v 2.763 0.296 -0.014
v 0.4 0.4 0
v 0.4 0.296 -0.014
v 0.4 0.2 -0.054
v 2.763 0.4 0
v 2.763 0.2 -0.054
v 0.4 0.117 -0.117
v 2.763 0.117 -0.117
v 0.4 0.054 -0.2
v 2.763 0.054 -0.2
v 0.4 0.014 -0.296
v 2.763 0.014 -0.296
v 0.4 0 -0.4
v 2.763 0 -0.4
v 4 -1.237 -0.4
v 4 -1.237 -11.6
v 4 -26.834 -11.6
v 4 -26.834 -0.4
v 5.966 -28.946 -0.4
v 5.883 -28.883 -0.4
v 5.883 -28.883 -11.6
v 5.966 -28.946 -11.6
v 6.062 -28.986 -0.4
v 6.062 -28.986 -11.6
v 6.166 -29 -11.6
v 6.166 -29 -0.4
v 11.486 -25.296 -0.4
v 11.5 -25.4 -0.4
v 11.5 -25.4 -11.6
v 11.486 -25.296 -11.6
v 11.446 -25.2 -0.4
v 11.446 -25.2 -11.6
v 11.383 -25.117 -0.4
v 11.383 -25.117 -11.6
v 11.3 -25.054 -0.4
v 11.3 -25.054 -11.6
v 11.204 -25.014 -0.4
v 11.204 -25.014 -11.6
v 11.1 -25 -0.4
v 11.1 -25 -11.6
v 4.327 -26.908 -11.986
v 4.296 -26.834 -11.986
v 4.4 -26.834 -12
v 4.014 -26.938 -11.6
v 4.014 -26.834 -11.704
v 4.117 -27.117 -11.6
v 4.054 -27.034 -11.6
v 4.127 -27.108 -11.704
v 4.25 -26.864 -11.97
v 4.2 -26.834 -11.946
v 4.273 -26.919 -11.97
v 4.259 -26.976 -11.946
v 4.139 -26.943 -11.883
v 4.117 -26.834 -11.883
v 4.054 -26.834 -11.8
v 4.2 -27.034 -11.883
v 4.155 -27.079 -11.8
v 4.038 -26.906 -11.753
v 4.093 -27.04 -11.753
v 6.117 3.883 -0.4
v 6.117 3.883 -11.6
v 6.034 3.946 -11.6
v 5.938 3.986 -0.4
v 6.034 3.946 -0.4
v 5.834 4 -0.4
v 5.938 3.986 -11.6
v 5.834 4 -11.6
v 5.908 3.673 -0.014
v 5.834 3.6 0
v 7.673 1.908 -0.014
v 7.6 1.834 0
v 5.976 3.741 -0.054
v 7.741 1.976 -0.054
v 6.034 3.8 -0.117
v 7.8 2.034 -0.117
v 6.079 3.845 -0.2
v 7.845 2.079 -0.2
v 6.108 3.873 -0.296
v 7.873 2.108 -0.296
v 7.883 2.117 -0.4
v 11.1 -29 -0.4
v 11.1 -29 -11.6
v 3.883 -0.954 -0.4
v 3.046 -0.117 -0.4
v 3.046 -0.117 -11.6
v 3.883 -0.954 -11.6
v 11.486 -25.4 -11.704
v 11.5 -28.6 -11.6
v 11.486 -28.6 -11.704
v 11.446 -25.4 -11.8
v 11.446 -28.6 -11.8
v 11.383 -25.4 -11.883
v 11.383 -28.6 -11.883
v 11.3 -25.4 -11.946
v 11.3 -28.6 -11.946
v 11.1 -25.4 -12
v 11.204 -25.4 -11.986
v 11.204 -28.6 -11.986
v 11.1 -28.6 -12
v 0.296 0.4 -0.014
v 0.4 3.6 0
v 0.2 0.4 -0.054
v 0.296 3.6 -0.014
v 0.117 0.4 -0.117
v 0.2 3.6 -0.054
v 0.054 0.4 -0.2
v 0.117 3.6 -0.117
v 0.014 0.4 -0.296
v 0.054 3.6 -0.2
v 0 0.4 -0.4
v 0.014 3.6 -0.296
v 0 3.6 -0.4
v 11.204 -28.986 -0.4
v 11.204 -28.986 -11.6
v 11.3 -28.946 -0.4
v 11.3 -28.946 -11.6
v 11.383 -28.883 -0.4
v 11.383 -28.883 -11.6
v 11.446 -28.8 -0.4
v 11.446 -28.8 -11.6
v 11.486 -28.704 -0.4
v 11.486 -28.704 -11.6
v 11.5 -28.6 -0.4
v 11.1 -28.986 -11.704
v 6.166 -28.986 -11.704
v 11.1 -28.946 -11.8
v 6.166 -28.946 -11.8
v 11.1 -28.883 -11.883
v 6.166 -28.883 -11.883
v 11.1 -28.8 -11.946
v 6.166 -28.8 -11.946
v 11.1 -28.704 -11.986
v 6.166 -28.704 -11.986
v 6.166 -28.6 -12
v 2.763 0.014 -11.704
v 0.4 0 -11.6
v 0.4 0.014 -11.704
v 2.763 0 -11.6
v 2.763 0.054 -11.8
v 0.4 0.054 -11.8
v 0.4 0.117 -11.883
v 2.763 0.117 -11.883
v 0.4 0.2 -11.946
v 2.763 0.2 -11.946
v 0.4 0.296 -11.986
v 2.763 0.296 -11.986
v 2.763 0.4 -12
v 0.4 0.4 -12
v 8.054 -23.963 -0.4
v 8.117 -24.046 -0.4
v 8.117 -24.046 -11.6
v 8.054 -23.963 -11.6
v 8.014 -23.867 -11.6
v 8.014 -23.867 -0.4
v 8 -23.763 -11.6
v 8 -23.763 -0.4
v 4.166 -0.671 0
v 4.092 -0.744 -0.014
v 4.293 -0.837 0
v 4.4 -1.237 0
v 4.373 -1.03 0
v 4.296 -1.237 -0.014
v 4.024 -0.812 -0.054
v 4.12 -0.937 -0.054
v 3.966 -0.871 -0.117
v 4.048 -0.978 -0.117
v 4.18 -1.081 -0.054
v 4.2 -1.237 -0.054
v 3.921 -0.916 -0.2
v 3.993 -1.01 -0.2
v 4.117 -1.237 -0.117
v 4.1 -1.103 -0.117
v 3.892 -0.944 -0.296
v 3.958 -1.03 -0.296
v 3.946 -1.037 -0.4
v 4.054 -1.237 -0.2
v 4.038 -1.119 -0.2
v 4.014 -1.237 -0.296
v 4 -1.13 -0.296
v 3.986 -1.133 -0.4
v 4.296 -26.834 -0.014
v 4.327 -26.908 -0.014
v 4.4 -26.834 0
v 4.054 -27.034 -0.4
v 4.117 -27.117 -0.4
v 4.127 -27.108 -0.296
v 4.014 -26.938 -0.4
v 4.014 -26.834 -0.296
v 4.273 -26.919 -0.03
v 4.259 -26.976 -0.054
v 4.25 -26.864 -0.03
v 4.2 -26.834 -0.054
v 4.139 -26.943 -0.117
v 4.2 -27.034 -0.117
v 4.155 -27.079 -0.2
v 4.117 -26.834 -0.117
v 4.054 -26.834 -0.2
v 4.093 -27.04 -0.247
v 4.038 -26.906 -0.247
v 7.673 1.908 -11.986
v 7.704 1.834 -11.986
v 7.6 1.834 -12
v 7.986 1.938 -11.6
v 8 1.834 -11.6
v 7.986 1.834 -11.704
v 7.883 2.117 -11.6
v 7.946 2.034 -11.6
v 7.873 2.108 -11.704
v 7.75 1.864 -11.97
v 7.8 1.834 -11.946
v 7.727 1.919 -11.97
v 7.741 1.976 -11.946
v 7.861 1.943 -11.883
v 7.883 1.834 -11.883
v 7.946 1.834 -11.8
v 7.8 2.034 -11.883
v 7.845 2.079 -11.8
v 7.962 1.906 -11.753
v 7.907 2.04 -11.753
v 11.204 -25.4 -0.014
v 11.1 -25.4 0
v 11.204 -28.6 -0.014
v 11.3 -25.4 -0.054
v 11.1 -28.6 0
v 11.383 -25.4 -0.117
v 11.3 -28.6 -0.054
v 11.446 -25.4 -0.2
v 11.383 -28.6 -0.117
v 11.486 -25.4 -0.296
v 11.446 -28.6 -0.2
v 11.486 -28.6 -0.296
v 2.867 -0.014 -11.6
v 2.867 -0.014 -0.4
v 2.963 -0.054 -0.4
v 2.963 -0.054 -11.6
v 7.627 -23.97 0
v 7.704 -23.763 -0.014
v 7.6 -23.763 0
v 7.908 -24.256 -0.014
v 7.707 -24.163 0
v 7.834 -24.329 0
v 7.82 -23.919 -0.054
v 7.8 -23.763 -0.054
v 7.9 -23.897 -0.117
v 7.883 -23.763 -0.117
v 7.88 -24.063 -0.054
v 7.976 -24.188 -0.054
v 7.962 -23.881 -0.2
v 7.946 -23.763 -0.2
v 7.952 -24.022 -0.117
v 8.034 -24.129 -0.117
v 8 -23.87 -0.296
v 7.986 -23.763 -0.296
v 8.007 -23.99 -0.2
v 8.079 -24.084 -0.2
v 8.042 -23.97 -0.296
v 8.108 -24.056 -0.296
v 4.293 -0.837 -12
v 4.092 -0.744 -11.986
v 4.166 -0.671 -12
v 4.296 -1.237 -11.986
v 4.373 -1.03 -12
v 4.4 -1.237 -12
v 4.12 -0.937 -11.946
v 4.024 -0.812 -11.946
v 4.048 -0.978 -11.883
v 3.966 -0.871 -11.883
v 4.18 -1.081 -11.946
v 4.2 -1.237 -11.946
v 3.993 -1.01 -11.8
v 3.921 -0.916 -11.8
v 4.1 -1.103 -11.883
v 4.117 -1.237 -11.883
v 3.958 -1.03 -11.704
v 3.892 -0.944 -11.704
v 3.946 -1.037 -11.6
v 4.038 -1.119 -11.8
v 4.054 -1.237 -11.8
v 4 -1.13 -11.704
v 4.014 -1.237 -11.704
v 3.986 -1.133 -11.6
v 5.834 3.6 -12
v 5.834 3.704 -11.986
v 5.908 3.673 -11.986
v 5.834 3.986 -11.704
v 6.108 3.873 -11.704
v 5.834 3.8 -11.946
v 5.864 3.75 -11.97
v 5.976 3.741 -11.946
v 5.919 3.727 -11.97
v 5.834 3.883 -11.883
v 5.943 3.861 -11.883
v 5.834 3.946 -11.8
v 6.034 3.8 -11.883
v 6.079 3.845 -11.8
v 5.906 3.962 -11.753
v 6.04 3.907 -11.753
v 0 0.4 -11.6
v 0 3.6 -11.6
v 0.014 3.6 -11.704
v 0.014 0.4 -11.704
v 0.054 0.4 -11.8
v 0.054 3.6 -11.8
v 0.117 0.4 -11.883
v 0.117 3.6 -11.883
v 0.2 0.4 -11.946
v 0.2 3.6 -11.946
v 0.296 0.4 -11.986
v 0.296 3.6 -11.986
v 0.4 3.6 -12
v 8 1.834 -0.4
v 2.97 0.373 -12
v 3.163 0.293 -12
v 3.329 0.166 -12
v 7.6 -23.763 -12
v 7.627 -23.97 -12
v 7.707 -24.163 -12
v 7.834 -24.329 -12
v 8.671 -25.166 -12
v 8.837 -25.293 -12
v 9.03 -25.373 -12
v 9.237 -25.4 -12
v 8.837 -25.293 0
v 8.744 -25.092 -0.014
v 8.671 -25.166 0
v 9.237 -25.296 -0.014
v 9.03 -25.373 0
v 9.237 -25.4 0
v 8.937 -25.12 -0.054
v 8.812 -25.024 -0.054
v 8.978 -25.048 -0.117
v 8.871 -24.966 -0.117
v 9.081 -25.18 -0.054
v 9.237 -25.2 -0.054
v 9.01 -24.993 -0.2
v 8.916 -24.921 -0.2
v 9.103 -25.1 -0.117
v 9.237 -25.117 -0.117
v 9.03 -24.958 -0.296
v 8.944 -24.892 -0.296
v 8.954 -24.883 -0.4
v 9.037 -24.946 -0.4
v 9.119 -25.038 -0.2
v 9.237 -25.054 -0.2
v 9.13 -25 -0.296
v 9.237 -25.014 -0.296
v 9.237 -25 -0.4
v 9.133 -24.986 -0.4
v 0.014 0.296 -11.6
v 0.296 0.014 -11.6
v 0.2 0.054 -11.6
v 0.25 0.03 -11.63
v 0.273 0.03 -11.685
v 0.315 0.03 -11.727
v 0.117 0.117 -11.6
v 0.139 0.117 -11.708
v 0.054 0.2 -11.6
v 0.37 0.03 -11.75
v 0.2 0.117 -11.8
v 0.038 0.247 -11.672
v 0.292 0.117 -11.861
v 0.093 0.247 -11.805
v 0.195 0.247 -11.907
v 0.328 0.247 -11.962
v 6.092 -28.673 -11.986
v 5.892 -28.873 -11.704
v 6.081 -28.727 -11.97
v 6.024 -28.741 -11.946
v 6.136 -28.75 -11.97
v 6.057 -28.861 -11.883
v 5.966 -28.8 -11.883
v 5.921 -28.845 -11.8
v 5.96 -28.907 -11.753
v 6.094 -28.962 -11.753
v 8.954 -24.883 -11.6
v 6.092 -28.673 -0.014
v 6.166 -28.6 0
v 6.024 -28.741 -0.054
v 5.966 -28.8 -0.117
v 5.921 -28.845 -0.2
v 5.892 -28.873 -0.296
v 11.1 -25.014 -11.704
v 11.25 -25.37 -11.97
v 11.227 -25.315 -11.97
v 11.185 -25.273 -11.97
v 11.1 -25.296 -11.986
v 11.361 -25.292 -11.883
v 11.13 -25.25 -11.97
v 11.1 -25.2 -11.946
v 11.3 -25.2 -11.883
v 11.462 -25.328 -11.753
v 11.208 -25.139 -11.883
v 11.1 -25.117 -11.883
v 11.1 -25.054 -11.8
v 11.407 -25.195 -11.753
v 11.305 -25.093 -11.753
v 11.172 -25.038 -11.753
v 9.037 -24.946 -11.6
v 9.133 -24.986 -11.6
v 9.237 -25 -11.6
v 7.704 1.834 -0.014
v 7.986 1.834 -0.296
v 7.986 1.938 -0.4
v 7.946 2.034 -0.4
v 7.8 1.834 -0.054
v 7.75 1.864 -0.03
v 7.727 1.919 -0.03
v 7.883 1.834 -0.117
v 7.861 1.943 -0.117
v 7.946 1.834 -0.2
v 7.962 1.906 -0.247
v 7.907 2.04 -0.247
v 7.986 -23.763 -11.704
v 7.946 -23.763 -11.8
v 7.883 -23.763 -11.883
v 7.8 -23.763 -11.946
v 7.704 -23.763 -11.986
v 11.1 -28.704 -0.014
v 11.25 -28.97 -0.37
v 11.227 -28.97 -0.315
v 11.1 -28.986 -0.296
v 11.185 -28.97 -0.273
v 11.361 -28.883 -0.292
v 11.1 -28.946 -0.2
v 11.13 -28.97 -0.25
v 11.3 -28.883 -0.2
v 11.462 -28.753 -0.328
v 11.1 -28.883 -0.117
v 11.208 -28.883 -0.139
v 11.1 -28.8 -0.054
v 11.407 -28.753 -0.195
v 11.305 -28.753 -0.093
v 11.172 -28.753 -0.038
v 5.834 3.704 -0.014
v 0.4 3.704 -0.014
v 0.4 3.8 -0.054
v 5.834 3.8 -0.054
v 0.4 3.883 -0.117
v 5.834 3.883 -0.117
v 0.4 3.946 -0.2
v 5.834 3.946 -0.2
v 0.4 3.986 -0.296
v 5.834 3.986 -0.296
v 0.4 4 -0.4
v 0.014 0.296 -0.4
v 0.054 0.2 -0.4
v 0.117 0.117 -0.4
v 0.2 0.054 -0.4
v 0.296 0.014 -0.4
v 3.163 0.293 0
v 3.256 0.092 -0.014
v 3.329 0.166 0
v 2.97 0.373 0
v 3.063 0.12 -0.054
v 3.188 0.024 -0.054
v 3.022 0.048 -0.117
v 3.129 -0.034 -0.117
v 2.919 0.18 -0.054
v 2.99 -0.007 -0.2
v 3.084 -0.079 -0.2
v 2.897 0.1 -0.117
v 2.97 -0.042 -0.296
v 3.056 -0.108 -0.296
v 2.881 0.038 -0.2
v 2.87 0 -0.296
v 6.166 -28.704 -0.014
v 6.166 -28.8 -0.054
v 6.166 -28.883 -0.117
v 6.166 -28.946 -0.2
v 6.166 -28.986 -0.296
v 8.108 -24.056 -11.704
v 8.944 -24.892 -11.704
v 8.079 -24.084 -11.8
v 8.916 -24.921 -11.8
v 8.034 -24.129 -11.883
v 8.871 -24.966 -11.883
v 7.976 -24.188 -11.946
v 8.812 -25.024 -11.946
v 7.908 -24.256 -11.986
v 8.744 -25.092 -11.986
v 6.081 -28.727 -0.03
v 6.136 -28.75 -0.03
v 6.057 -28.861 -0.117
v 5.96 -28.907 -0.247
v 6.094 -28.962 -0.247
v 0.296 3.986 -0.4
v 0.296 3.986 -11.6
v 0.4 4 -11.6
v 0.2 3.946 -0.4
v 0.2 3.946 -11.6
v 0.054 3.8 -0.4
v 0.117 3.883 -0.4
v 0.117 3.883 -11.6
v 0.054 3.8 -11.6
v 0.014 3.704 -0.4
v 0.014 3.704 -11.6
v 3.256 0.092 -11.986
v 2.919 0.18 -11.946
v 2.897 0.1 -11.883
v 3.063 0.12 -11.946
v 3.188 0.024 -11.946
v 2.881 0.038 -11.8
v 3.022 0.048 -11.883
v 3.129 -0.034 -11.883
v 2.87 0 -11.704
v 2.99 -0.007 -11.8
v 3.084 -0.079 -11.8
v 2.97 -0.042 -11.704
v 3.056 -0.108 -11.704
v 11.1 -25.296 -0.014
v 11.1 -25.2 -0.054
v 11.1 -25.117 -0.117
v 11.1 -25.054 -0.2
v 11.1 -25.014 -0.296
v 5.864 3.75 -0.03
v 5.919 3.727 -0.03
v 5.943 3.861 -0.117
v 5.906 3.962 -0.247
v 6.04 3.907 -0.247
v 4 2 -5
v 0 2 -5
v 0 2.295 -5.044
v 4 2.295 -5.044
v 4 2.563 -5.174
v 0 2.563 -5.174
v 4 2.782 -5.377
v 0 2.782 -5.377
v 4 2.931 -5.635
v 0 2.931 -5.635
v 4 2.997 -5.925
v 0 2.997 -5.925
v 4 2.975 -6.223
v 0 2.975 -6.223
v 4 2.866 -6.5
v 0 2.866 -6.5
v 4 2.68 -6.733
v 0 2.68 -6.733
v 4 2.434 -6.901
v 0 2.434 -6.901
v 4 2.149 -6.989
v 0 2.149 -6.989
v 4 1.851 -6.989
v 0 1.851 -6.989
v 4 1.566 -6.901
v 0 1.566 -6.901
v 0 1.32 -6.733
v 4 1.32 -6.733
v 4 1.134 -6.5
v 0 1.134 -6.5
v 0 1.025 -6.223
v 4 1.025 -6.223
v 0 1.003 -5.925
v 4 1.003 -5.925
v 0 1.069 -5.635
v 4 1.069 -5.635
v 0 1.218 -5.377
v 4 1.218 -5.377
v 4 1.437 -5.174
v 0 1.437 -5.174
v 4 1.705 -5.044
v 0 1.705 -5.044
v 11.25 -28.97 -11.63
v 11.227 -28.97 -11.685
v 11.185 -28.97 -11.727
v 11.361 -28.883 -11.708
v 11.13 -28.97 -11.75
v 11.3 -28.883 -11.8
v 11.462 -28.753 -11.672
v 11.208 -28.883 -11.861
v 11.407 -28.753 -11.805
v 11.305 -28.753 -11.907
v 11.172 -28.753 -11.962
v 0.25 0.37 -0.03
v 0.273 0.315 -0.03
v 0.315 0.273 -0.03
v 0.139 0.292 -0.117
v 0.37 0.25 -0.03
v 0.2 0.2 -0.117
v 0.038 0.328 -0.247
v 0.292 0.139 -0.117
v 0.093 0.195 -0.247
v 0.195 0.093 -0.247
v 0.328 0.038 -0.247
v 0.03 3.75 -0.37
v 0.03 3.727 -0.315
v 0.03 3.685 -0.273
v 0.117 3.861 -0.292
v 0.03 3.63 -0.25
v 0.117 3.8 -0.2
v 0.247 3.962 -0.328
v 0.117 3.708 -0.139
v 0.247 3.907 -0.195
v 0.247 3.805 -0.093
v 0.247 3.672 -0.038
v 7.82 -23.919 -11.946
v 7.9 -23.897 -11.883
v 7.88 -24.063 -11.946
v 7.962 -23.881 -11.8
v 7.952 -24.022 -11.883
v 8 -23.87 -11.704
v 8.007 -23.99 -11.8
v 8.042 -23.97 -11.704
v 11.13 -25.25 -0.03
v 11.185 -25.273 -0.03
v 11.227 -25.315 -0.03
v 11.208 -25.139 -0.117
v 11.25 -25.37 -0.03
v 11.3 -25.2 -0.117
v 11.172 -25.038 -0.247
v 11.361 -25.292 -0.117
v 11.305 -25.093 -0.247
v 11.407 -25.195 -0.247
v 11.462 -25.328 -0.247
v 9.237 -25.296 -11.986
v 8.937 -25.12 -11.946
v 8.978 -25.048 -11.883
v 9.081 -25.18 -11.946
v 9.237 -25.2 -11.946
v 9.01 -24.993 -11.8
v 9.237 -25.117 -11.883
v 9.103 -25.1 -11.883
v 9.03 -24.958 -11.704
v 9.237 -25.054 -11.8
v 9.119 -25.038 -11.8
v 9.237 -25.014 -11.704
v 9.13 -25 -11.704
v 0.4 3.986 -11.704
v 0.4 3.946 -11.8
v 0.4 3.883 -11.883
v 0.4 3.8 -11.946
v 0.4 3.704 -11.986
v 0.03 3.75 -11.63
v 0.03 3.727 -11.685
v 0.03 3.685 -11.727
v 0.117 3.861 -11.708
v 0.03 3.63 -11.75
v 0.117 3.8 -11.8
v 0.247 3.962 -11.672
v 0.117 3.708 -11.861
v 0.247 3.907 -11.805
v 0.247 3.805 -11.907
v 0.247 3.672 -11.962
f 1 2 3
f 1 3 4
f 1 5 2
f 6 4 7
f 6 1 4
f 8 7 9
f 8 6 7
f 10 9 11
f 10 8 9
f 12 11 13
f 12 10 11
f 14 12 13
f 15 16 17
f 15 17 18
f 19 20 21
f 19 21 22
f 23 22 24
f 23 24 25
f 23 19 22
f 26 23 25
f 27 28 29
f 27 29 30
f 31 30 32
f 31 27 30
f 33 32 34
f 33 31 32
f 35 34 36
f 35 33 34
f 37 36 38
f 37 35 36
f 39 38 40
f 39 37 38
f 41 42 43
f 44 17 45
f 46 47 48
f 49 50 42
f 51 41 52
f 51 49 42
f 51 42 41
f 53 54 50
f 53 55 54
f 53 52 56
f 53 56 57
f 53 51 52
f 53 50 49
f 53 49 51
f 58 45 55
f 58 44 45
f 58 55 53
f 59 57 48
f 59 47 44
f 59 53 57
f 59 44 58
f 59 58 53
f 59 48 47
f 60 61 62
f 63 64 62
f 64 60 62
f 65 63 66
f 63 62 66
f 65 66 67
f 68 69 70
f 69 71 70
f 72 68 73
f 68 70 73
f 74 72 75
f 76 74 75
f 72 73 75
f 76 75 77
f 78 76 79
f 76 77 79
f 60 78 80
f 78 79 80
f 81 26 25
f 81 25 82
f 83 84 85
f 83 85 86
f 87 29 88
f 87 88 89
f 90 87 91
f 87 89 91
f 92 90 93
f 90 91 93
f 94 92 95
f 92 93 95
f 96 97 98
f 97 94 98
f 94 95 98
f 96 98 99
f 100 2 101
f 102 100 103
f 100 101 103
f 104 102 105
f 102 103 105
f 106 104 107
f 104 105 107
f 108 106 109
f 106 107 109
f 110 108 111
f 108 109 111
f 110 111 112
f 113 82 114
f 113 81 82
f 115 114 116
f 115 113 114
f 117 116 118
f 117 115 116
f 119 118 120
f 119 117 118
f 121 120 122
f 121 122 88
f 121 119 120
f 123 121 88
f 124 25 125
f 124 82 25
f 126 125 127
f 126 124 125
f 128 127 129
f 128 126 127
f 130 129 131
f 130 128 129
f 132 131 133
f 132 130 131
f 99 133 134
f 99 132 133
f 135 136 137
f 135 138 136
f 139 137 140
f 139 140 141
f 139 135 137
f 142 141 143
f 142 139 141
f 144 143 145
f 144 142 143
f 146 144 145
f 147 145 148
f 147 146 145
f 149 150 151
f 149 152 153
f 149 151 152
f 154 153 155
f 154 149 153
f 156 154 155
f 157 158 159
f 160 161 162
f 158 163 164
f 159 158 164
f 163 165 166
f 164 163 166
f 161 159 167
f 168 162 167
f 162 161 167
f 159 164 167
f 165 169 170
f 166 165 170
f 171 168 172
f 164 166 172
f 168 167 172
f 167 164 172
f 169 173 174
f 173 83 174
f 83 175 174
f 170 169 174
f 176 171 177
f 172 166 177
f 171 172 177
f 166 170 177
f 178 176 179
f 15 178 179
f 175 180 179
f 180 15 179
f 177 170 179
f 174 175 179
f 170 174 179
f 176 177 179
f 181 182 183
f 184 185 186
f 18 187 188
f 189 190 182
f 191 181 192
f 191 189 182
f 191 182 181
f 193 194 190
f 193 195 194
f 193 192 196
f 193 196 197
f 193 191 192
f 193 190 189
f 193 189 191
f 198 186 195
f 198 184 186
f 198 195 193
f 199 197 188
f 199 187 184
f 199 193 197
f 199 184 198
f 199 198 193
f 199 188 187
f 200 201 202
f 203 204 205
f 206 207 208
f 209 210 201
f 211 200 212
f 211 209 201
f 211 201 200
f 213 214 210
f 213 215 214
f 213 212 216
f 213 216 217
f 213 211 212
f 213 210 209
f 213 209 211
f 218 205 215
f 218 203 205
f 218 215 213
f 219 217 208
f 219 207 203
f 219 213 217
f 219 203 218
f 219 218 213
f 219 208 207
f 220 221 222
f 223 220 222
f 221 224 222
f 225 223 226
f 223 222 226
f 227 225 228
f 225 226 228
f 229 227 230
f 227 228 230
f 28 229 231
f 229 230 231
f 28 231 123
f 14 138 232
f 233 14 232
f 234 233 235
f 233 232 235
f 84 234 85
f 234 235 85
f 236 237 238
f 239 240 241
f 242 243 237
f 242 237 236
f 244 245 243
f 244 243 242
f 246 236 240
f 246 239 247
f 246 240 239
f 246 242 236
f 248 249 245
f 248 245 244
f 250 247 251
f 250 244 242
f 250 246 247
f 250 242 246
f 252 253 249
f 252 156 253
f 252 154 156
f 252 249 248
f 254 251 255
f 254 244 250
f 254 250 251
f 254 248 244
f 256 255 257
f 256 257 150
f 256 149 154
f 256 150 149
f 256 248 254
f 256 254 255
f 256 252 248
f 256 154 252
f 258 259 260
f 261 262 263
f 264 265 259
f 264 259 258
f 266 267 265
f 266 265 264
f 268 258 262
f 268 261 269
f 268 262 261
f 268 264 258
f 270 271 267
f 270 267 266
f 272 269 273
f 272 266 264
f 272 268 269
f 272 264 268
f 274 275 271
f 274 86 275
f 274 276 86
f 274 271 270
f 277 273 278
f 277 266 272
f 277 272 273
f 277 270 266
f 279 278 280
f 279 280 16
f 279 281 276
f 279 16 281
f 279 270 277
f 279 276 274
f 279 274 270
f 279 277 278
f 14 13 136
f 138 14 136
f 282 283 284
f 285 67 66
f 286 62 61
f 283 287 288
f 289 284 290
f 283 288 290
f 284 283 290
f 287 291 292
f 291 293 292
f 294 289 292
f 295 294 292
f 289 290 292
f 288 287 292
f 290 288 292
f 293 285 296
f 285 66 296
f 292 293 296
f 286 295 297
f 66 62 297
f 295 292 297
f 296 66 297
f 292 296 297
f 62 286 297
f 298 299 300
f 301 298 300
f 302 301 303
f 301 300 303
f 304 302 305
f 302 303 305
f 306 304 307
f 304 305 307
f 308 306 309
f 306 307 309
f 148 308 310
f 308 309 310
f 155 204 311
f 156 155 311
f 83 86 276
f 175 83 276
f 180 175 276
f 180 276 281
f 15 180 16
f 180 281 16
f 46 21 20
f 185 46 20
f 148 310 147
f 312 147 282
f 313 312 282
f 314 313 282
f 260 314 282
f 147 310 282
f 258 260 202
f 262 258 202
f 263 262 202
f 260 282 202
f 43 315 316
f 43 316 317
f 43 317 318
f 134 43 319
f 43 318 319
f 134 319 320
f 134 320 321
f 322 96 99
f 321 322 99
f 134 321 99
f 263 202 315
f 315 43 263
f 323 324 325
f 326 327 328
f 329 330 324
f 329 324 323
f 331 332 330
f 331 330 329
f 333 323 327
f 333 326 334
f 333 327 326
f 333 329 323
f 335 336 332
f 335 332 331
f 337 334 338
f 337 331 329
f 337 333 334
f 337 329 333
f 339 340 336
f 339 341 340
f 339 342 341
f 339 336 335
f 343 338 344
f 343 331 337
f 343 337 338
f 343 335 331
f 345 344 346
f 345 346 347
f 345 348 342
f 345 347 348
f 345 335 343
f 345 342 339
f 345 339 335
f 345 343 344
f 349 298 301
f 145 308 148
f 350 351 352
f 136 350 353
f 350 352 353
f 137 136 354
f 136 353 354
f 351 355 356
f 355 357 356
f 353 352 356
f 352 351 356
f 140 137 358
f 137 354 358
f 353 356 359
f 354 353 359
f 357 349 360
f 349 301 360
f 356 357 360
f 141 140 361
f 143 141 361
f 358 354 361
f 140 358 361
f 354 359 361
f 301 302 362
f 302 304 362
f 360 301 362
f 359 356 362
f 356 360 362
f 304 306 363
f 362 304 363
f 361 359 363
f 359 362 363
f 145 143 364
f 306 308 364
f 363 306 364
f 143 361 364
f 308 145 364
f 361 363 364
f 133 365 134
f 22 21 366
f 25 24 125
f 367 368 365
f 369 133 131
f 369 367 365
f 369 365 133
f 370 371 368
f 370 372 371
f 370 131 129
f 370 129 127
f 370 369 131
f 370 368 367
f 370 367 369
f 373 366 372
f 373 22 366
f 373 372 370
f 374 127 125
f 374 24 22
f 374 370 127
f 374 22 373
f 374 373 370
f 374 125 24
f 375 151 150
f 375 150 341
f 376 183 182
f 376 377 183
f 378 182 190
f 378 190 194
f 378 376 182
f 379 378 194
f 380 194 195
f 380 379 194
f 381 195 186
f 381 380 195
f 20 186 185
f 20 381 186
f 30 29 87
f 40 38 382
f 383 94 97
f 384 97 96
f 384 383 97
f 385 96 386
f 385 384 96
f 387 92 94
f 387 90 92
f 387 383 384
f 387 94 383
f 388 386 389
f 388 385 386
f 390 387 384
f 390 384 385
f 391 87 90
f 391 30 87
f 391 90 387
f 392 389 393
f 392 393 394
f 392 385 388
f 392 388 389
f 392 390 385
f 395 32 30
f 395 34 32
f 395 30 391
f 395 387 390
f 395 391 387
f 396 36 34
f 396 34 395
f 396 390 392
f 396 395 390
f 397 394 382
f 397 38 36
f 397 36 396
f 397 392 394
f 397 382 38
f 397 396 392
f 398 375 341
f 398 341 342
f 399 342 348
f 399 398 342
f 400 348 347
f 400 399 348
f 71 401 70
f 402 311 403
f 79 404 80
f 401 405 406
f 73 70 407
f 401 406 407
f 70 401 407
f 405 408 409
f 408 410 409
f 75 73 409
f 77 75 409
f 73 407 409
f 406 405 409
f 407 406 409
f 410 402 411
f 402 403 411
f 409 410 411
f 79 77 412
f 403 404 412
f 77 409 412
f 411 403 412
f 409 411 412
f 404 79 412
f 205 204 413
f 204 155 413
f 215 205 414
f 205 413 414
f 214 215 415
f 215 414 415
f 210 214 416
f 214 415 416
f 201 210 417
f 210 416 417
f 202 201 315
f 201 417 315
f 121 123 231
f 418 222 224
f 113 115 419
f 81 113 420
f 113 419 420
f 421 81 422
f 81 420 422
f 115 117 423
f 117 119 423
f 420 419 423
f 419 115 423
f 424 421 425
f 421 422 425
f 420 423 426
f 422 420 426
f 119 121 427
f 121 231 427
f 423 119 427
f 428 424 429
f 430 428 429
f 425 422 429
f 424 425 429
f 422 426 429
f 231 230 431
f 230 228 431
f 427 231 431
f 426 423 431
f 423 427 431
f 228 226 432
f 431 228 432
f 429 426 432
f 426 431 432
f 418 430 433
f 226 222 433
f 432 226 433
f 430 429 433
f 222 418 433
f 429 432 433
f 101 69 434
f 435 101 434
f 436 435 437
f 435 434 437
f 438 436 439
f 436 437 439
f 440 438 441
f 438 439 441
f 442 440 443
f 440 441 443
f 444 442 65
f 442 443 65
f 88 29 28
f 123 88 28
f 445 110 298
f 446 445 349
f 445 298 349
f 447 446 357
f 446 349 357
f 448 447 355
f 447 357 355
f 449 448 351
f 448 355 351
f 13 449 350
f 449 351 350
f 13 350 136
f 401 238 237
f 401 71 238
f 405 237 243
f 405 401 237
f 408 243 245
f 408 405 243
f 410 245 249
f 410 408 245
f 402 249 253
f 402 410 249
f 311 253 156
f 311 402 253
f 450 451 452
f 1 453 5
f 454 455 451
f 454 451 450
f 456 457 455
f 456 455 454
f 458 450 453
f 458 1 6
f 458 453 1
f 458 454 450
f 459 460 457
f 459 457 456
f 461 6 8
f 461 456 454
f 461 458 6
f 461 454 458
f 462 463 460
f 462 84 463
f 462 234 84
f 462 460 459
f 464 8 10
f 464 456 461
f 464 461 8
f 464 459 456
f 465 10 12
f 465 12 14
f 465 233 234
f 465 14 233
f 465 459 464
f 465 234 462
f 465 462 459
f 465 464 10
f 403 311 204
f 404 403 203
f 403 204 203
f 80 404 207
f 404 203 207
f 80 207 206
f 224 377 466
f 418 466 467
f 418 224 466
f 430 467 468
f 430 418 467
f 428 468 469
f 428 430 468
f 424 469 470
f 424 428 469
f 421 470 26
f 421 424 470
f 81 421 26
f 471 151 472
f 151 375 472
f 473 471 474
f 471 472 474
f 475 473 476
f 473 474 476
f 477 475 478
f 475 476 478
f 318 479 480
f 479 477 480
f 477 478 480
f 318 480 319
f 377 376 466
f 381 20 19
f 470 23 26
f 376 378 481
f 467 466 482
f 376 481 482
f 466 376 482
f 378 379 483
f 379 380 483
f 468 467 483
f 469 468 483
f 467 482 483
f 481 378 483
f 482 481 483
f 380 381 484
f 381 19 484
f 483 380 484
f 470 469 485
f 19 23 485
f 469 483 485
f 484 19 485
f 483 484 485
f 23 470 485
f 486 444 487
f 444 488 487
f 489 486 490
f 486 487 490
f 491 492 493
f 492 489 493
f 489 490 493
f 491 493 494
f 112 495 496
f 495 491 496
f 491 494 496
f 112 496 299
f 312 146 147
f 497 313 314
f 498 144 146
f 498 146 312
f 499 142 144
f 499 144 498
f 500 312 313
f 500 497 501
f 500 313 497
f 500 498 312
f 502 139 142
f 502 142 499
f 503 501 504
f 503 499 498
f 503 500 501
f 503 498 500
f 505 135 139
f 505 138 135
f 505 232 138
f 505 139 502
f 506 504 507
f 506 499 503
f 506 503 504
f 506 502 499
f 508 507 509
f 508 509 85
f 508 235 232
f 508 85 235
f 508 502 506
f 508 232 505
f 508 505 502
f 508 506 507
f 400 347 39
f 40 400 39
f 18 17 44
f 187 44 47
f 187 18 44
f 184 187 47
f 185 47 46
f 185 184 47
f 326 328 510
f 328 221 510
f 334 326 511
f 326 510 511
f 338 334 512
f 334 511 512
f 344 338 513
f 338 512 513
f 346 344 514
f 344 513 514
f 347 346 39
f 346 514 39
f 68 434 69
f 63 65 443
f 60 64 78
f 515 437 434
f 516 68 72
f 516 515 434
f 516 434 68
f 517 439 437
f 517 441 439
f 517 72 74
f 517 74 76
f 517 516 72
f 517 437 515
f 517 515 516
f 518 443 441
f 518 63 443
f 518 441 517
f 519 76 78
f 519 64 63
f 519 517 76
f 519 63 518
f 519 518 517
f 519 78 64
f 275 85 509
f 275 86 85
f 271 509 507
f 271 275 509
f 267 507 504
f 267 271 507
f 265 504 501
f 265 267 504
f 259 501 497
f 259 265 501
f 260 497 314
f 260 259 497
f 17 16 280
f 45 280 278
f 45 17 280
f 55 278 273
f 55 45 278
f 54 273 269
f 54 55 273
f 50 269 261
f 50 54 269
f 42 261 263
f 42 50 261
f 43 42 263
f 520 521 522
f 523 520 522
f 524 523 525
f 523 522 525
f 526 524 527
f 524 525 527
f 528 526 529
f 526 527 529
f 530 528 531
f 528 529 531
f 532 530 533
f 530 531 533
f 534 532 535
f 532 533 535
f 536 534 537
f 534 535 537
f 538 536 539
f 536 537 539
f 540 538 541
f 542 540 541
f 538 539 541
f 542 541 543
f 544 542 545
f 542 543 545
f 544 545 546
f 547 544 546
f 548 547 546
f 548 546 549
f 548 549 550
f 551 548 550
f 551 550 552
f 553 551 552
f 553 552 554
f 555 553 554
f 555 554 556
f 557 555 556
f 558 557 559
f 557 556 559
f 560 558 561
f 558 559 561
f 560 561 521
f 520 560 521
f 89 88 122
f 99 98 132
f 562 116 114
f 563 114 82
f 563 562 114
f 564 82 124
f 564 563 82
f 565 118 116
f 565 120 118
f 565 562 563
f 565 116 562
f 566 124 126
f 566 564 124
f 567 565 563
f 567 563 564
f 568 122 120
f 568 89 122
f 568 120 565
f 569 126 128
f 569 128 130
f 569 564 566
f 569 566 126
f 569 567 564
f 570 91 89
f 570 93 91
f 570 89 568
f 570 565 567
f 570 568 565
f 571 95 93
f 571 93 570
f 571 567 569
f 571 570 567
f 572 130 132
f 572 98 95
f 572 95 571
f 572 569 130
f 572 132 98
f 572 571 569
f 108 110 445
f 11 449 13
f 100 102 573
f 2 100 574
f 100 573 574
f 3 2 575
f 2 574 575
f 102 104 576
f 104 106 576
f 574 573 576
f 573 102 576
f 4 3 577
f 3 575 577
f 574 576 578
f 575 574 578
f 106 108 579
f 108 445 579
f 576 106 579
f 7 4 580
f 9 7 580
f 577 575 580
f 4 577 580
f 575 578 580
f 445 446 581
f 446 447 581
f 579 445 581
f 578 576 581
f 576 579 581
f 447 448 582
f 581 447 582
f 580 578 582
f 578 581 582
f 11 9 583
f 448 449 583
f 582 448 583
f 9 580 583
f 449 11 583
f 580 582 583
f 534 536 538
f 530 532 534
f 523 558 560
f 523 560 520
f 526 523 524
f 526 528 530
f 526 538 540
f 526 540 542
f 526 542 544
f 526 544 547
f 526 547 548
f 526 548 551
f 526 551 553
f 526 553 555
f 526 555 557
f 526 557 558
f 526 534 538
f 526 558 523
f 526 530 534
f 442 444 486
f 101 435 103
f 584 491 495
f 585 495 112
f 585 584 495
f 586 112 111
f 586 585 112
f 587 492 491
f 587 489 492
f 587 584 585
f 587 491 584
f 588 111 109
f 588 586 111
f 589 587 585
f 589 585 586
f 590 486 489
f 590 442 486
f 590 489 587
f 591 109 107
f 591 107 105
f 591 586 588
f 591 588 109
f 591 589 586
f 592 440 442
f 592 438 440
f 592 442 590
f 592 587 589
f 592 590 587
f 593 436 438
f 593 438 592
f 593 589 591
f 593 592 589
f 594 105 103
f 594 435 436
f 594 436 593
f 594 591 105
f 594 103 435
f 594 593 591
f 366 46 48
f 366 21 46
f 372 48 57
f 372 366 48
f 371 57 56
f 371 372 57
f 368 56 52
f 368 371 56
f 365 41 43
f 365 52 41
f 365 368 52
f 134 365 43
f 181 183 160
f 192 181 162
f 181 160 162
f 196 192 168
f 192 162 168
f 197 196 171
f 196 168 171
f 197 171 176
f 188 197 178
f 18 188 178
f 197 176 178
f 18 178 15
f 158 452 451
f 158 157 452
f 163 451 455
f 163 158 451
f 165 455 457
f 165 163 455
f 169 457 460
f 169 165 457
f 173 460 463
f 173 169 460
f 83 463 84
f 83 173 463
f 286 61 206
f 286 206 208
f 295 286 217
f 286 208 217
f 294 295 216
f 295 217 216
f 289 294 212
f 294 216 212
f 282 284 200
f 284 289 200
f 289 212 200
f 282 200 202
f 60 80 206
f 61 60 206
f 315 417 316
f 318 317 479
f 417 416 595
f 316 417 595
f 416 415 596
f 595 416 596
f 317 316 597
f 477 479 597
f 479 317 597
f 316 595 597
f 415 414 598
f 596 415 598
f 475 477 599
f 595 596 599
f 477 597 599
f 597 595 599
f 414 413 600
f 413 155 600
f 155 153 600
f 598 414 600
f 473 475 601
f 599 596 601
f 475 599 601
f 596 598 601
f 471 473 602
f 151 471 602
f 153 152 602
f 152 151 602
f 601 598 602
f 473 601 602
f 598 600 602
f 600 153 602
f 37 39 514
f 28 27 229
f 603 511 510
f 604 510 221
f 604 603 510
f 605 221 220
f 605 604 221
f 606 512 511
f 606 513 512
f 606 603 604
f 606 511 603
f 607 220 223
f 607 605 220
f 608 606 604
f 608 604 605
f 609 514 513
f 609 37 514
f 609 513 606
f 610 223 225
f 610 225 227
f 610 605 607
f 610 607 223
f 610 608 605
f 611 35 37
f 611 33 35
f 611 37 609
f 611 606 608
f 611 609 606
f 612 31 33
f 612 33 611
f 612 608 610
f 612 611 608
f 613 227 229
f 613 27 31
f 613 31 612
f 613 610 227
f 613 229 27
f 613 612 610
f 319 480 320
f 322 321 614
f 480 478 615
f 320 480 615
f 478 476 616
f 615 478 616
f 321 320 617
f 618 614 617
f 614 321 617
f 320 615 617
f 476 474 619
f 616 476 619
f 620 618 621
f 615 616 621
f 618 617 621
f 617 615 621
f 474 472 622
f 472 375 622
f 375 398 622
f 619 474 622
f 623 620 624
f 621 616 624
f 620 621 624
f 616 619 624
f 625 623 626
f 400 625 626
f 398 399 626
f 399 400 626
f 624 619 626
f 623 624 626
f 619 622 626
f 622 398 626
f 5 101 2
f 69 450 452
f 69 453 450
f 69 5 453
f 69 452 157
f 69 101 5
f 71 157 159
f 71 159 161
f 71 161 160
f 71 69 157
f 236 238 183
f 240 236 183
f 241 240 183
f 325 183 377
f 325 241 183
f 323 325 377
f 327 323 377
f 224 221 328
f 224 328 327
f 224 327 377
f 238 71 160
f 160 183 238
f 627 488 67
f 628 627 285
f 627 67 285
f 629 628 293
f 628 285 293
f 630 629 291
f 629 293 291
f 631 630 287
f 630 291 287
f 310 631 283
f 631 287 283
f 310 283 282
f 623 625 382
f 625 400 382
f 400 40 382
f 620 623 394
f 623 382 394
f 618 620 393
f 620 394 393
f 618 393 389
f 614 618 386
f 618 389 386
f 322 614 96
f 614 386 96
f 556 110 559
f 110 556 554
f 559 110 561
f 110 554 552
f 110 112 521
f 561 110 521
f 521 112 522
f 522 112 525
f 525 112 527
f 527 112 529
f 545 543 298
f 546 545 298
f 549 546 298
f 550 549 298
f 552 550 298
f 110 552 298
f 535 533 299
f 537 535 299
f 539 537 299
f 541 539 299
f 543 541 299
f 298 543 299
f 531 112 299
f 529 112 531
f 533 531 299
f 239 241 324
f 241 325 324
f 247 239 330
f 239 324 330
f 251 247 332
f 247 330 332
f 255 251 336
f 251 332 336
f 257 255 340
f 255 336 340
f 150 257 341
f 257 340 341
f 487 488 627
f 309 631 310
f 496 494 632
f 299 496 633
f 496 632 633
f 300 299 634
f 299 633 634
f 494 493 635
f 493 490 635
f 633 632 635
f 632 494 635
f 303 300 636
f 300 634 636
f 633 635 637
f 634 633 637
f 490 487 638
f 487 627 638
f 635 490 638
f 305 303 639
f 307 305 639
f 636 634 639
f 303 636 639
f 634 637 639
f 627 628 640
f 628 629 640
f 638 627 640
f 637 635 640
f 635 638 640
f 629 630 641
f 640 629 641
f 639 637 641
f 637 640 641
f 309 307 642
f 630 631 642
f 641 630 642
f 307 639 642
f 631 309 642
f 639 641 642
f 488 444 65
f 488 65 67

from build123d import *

# Parameters (mm, degrees)
SKETCH1_W           = 12
SKETCH1_H           = 4
BOSS_EXTRUDE1_DEPTH = 8
SKETCH2_W           = 4
SKETCH2_H           = 12
BOSS_EXTRUDE2_DEPTH = 25
SKETCH3_W           = 7.5
SKETCH3_H           = 12
BOSS_EXTRUDE3_DEPTH = 4
CHAMFER1_SIZE       = 2
RIB1_REACH          = 35.425
SKETCH4_WALL_W      = 70.36529828
SKETCH4_WALL_H      = 12
RIB2_REACH          = 35.425
SKETCH5_WALL_W      = 70.36529828
SKETCH5_WALL_H      = 12
SKETCH7_R           = 1
CUT_EXTRUDE2_DEPTH  = 4
FILLET1_R           = 0.4


with BuildPart() as part:
    # Sketch1 → Boss-Extrude1 (new body)
    with BuildSketch(Plane(origin=(0, 0, 0), x_dir=(0, 0, -1), z_dir=(1, 0, 0))):
        with Locations((6, 2)):
            Rectangle(SKETCH1_W, SKETCH1_H)
    extrude(amount=BOSS_EXTRUDE1_DEPTH)

    # Sketch2 → Boss-Extrude2 (add)
    with BuildSketch(Plane.XZ):
        with Locations((6, -6)):
            Rectangle(SKETCH2_W, SKETCH2_H)
    extrude(amount=BOSS_EXTRUDE2_DEPTH)

    # Sketch3 → Boss-Extrude3 (add)
    with BuildSketch(Plane.XZ.offset(25)):
        with Locations((7.75, -6)):
            Rectangle(SKETCH3_W, SKETCH3_H)
    extrude(amount=BOSS_EXTRUDE3_DEPTH)

    # Chamfer1
    chamfer1_edges = [part.edges().sort_by_distance(p)[0] for p in [
        (8, 4, -6),
        (4, -29, -6),
    ]]
    chamfer(chamfer1_edges, length=CHAMFER1_SIZE)

    # Sketch4 wall → Rib1 (add, up to next)
    with BuildSketch(Plane(origin=(3.464466094, -0.535533906, -12), x_dir=(0.707106781187, -0.707106781187, 0), z_dir=(-0.707106781187, -0.707106781187, 0)), mode=Mode.PRIVATE) as rib1_sk1:
        with Locations((0, 6)):
            Rectangle(SKETCH4_WALL_W, SKETCH4_WALL_H)
    rib1_tool1 = extrude(rib1_sk1.sketch, amount=-RIB1_REACH, mode=Mode.PRIVATE) - part.part
    add(rib1_tool1.solids().sort_by_distance((3.464466094, -0.535533906, -12))[0])

    # Sketch5 wall → Rib2 (add, up to next)
    with BuildSketch(Plane(origin=(8.535533906, -24.464466094, 0), x_dir=(0.707106781187, -0.707106781187, 0), z_dir=(0.707106781187, 0.707106781187, 0)), mode=Mode.PRIVATE) as rib2_sk1:
        with Locations((0, 6)):
            Rectangle(SKETCH5_WALL_W, SKETCH5_WALL_H)
    rib2_tool1 = extrude(rib2_sk1.sketch, amount=-RIB2_REACH, mode=Mode.PRIVATE) - part.part
    add(rib2_tool1.solids().sort_by_distance((8.535533906, -24.464466094, 0))[0])

    # Sketch7 → Cut-Extrude2 (cut)
    with BuildSketch(Plane.ZY):
        with Locations((-6, 2)):
            Circle(SKETCH7_R)
    extrude(amount=-CUT_EXTRUDE2_DEPTH, mode=Mode.SUBTRACT)

    # Fillet1
    fillet1_edges = [part.edges().sort_by_distance(p)[0] for p in [
        (11.5, -25, -6),
        (11.5, -27, -12),
        (10.285533906, -25, 0),
        (11.5, -27, 0),
        (11.5, -29, -6),
        (8.75, -29, 0),
        (8.75, -29, -12),
        (6, -29, -6),
        (3, 4, -12),
        (4, -14.035533906, -12),
        (7, 3, -12),
        (5, -28, -12),
        (4, -14.035533906, 0),
        (4, -27, -6),
        (8, -10.964466094, 0),
        (3, 4, 0),
        (7, 3, 0),
        (5, -28, 0),
        (0, 4, -6),
        (8, 2, -6),
        (6, 4, -6),
        (0, 2, -12),
        (0, 0, -6),
        (4, -1.071067812, -6),
        (0, 2, 0),
        (1.464466094, 0, -12),
        (1.464466094, 0, 0),
        (3.464466094, -0.535533906, -12),
        (2.928932188, 0, -6),
        (3.464466094, -0.535533906, 0),
        (10.285533906, -25, -12),
        (9.071067812, -25, -6),
        (8, -10.964466094, -12),
        (8.535533906, -24.464466094, 0),
        (8.535533906, -24.464466094, -12),
        (8, -23.928932188, -6),
    ]]
    fillet(fillet1_edges, radius=FILLET1_R)


solid = part.part
